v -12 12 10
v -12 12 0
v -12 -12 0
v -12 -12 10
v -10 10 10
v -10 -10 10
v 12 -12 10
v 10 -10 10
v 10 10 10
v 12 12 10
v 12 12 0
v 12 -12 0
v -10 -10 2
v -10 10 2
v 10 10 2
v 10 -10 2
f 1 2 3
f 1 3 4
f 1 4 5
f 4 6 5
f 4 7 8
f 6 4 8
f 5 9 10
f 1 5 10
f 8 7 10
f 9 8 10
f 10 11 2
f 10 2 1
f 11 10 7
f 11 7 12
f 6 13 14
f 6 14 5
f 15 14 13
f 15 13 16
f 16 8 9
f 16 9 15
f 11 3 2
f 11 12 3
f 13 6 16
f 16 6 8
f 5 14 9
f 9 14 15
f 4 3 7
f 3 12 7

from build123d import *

# Parameters (mm, degrees)
SKETCH_1_W      = 20
SKETCH_1_H      = 20
EXTRUDE_1_DEPTH = 2
SKETCH_2_W      = 20
SKETCH_2_H      = 10
EXTRUDE_3_DEPTH = 2
SKETCH_4_W      = 20
SKETCH_4_H      = 10
EXTRUDE_4_DEPTH = 2
SKETCH_5_W      = 10
SKETCH_5_H      = 24
EXTRUDE_5_DEPTH = 2
SKETCH_6_W      = 10
SKETCH_6_H      = 24
EXTRUDE_6_DEPTH = 2


with BuildPart() as part:
    # 草图1 → 凸台-拉伸1 (new body)
    with BuildSketch(Plane.XY):
        Rectangle(SKETCH_1_W, SKETCH_1_H)
    extrude(amount=EXTRUDE_1_DEPTH)

    # 草图2 → 凸台-拉伸3 (add)
    with BuildSketch(Plane.XZ.offset(10)):
        with Locations((0, 5)):
            Rectangle(SKETCH_2_W, SKETCH_2_H)
    extrude(amount=EXTRUDE_3_DEPTH)

    # 草图4 → 凸台-拉伸4 (add)
    with BuildSketch(Plane(origin=(0, 10, 0), x_dir=(1, 0, 0), z_dir=(0, 1, 0))):
        with Locations((0, -5)):
            Rectangle(SKETCH_4_W, SKETCH_4_H)
    extrude(amount=EXTRUDE_4_DEPTH)

    # 草图5 → 凸台-拉伸5 (add)
    with BuildSketch(Plane(origin=(10, 0, 0), x_dir=(0, 0, -1), z_dir=(1, 0, 0))):
        with Locations((-5, 0)):
            Rectangle(SKETCH_5_W, SKETCH_5_H)
    extrude(amount=EXTRUDE_5_DEPTH)

    # 草图6 → 凸台-拉伸6 (add)
    with BuildSketch(Plane.ZY.offset(10)):
        with Locations((5, 0)):
            Rectangle(SKETCH_6_W, SKETCH_6_H)
    extrude(amount=EXTRUDE_6_DEPTH)


solid = part.part
